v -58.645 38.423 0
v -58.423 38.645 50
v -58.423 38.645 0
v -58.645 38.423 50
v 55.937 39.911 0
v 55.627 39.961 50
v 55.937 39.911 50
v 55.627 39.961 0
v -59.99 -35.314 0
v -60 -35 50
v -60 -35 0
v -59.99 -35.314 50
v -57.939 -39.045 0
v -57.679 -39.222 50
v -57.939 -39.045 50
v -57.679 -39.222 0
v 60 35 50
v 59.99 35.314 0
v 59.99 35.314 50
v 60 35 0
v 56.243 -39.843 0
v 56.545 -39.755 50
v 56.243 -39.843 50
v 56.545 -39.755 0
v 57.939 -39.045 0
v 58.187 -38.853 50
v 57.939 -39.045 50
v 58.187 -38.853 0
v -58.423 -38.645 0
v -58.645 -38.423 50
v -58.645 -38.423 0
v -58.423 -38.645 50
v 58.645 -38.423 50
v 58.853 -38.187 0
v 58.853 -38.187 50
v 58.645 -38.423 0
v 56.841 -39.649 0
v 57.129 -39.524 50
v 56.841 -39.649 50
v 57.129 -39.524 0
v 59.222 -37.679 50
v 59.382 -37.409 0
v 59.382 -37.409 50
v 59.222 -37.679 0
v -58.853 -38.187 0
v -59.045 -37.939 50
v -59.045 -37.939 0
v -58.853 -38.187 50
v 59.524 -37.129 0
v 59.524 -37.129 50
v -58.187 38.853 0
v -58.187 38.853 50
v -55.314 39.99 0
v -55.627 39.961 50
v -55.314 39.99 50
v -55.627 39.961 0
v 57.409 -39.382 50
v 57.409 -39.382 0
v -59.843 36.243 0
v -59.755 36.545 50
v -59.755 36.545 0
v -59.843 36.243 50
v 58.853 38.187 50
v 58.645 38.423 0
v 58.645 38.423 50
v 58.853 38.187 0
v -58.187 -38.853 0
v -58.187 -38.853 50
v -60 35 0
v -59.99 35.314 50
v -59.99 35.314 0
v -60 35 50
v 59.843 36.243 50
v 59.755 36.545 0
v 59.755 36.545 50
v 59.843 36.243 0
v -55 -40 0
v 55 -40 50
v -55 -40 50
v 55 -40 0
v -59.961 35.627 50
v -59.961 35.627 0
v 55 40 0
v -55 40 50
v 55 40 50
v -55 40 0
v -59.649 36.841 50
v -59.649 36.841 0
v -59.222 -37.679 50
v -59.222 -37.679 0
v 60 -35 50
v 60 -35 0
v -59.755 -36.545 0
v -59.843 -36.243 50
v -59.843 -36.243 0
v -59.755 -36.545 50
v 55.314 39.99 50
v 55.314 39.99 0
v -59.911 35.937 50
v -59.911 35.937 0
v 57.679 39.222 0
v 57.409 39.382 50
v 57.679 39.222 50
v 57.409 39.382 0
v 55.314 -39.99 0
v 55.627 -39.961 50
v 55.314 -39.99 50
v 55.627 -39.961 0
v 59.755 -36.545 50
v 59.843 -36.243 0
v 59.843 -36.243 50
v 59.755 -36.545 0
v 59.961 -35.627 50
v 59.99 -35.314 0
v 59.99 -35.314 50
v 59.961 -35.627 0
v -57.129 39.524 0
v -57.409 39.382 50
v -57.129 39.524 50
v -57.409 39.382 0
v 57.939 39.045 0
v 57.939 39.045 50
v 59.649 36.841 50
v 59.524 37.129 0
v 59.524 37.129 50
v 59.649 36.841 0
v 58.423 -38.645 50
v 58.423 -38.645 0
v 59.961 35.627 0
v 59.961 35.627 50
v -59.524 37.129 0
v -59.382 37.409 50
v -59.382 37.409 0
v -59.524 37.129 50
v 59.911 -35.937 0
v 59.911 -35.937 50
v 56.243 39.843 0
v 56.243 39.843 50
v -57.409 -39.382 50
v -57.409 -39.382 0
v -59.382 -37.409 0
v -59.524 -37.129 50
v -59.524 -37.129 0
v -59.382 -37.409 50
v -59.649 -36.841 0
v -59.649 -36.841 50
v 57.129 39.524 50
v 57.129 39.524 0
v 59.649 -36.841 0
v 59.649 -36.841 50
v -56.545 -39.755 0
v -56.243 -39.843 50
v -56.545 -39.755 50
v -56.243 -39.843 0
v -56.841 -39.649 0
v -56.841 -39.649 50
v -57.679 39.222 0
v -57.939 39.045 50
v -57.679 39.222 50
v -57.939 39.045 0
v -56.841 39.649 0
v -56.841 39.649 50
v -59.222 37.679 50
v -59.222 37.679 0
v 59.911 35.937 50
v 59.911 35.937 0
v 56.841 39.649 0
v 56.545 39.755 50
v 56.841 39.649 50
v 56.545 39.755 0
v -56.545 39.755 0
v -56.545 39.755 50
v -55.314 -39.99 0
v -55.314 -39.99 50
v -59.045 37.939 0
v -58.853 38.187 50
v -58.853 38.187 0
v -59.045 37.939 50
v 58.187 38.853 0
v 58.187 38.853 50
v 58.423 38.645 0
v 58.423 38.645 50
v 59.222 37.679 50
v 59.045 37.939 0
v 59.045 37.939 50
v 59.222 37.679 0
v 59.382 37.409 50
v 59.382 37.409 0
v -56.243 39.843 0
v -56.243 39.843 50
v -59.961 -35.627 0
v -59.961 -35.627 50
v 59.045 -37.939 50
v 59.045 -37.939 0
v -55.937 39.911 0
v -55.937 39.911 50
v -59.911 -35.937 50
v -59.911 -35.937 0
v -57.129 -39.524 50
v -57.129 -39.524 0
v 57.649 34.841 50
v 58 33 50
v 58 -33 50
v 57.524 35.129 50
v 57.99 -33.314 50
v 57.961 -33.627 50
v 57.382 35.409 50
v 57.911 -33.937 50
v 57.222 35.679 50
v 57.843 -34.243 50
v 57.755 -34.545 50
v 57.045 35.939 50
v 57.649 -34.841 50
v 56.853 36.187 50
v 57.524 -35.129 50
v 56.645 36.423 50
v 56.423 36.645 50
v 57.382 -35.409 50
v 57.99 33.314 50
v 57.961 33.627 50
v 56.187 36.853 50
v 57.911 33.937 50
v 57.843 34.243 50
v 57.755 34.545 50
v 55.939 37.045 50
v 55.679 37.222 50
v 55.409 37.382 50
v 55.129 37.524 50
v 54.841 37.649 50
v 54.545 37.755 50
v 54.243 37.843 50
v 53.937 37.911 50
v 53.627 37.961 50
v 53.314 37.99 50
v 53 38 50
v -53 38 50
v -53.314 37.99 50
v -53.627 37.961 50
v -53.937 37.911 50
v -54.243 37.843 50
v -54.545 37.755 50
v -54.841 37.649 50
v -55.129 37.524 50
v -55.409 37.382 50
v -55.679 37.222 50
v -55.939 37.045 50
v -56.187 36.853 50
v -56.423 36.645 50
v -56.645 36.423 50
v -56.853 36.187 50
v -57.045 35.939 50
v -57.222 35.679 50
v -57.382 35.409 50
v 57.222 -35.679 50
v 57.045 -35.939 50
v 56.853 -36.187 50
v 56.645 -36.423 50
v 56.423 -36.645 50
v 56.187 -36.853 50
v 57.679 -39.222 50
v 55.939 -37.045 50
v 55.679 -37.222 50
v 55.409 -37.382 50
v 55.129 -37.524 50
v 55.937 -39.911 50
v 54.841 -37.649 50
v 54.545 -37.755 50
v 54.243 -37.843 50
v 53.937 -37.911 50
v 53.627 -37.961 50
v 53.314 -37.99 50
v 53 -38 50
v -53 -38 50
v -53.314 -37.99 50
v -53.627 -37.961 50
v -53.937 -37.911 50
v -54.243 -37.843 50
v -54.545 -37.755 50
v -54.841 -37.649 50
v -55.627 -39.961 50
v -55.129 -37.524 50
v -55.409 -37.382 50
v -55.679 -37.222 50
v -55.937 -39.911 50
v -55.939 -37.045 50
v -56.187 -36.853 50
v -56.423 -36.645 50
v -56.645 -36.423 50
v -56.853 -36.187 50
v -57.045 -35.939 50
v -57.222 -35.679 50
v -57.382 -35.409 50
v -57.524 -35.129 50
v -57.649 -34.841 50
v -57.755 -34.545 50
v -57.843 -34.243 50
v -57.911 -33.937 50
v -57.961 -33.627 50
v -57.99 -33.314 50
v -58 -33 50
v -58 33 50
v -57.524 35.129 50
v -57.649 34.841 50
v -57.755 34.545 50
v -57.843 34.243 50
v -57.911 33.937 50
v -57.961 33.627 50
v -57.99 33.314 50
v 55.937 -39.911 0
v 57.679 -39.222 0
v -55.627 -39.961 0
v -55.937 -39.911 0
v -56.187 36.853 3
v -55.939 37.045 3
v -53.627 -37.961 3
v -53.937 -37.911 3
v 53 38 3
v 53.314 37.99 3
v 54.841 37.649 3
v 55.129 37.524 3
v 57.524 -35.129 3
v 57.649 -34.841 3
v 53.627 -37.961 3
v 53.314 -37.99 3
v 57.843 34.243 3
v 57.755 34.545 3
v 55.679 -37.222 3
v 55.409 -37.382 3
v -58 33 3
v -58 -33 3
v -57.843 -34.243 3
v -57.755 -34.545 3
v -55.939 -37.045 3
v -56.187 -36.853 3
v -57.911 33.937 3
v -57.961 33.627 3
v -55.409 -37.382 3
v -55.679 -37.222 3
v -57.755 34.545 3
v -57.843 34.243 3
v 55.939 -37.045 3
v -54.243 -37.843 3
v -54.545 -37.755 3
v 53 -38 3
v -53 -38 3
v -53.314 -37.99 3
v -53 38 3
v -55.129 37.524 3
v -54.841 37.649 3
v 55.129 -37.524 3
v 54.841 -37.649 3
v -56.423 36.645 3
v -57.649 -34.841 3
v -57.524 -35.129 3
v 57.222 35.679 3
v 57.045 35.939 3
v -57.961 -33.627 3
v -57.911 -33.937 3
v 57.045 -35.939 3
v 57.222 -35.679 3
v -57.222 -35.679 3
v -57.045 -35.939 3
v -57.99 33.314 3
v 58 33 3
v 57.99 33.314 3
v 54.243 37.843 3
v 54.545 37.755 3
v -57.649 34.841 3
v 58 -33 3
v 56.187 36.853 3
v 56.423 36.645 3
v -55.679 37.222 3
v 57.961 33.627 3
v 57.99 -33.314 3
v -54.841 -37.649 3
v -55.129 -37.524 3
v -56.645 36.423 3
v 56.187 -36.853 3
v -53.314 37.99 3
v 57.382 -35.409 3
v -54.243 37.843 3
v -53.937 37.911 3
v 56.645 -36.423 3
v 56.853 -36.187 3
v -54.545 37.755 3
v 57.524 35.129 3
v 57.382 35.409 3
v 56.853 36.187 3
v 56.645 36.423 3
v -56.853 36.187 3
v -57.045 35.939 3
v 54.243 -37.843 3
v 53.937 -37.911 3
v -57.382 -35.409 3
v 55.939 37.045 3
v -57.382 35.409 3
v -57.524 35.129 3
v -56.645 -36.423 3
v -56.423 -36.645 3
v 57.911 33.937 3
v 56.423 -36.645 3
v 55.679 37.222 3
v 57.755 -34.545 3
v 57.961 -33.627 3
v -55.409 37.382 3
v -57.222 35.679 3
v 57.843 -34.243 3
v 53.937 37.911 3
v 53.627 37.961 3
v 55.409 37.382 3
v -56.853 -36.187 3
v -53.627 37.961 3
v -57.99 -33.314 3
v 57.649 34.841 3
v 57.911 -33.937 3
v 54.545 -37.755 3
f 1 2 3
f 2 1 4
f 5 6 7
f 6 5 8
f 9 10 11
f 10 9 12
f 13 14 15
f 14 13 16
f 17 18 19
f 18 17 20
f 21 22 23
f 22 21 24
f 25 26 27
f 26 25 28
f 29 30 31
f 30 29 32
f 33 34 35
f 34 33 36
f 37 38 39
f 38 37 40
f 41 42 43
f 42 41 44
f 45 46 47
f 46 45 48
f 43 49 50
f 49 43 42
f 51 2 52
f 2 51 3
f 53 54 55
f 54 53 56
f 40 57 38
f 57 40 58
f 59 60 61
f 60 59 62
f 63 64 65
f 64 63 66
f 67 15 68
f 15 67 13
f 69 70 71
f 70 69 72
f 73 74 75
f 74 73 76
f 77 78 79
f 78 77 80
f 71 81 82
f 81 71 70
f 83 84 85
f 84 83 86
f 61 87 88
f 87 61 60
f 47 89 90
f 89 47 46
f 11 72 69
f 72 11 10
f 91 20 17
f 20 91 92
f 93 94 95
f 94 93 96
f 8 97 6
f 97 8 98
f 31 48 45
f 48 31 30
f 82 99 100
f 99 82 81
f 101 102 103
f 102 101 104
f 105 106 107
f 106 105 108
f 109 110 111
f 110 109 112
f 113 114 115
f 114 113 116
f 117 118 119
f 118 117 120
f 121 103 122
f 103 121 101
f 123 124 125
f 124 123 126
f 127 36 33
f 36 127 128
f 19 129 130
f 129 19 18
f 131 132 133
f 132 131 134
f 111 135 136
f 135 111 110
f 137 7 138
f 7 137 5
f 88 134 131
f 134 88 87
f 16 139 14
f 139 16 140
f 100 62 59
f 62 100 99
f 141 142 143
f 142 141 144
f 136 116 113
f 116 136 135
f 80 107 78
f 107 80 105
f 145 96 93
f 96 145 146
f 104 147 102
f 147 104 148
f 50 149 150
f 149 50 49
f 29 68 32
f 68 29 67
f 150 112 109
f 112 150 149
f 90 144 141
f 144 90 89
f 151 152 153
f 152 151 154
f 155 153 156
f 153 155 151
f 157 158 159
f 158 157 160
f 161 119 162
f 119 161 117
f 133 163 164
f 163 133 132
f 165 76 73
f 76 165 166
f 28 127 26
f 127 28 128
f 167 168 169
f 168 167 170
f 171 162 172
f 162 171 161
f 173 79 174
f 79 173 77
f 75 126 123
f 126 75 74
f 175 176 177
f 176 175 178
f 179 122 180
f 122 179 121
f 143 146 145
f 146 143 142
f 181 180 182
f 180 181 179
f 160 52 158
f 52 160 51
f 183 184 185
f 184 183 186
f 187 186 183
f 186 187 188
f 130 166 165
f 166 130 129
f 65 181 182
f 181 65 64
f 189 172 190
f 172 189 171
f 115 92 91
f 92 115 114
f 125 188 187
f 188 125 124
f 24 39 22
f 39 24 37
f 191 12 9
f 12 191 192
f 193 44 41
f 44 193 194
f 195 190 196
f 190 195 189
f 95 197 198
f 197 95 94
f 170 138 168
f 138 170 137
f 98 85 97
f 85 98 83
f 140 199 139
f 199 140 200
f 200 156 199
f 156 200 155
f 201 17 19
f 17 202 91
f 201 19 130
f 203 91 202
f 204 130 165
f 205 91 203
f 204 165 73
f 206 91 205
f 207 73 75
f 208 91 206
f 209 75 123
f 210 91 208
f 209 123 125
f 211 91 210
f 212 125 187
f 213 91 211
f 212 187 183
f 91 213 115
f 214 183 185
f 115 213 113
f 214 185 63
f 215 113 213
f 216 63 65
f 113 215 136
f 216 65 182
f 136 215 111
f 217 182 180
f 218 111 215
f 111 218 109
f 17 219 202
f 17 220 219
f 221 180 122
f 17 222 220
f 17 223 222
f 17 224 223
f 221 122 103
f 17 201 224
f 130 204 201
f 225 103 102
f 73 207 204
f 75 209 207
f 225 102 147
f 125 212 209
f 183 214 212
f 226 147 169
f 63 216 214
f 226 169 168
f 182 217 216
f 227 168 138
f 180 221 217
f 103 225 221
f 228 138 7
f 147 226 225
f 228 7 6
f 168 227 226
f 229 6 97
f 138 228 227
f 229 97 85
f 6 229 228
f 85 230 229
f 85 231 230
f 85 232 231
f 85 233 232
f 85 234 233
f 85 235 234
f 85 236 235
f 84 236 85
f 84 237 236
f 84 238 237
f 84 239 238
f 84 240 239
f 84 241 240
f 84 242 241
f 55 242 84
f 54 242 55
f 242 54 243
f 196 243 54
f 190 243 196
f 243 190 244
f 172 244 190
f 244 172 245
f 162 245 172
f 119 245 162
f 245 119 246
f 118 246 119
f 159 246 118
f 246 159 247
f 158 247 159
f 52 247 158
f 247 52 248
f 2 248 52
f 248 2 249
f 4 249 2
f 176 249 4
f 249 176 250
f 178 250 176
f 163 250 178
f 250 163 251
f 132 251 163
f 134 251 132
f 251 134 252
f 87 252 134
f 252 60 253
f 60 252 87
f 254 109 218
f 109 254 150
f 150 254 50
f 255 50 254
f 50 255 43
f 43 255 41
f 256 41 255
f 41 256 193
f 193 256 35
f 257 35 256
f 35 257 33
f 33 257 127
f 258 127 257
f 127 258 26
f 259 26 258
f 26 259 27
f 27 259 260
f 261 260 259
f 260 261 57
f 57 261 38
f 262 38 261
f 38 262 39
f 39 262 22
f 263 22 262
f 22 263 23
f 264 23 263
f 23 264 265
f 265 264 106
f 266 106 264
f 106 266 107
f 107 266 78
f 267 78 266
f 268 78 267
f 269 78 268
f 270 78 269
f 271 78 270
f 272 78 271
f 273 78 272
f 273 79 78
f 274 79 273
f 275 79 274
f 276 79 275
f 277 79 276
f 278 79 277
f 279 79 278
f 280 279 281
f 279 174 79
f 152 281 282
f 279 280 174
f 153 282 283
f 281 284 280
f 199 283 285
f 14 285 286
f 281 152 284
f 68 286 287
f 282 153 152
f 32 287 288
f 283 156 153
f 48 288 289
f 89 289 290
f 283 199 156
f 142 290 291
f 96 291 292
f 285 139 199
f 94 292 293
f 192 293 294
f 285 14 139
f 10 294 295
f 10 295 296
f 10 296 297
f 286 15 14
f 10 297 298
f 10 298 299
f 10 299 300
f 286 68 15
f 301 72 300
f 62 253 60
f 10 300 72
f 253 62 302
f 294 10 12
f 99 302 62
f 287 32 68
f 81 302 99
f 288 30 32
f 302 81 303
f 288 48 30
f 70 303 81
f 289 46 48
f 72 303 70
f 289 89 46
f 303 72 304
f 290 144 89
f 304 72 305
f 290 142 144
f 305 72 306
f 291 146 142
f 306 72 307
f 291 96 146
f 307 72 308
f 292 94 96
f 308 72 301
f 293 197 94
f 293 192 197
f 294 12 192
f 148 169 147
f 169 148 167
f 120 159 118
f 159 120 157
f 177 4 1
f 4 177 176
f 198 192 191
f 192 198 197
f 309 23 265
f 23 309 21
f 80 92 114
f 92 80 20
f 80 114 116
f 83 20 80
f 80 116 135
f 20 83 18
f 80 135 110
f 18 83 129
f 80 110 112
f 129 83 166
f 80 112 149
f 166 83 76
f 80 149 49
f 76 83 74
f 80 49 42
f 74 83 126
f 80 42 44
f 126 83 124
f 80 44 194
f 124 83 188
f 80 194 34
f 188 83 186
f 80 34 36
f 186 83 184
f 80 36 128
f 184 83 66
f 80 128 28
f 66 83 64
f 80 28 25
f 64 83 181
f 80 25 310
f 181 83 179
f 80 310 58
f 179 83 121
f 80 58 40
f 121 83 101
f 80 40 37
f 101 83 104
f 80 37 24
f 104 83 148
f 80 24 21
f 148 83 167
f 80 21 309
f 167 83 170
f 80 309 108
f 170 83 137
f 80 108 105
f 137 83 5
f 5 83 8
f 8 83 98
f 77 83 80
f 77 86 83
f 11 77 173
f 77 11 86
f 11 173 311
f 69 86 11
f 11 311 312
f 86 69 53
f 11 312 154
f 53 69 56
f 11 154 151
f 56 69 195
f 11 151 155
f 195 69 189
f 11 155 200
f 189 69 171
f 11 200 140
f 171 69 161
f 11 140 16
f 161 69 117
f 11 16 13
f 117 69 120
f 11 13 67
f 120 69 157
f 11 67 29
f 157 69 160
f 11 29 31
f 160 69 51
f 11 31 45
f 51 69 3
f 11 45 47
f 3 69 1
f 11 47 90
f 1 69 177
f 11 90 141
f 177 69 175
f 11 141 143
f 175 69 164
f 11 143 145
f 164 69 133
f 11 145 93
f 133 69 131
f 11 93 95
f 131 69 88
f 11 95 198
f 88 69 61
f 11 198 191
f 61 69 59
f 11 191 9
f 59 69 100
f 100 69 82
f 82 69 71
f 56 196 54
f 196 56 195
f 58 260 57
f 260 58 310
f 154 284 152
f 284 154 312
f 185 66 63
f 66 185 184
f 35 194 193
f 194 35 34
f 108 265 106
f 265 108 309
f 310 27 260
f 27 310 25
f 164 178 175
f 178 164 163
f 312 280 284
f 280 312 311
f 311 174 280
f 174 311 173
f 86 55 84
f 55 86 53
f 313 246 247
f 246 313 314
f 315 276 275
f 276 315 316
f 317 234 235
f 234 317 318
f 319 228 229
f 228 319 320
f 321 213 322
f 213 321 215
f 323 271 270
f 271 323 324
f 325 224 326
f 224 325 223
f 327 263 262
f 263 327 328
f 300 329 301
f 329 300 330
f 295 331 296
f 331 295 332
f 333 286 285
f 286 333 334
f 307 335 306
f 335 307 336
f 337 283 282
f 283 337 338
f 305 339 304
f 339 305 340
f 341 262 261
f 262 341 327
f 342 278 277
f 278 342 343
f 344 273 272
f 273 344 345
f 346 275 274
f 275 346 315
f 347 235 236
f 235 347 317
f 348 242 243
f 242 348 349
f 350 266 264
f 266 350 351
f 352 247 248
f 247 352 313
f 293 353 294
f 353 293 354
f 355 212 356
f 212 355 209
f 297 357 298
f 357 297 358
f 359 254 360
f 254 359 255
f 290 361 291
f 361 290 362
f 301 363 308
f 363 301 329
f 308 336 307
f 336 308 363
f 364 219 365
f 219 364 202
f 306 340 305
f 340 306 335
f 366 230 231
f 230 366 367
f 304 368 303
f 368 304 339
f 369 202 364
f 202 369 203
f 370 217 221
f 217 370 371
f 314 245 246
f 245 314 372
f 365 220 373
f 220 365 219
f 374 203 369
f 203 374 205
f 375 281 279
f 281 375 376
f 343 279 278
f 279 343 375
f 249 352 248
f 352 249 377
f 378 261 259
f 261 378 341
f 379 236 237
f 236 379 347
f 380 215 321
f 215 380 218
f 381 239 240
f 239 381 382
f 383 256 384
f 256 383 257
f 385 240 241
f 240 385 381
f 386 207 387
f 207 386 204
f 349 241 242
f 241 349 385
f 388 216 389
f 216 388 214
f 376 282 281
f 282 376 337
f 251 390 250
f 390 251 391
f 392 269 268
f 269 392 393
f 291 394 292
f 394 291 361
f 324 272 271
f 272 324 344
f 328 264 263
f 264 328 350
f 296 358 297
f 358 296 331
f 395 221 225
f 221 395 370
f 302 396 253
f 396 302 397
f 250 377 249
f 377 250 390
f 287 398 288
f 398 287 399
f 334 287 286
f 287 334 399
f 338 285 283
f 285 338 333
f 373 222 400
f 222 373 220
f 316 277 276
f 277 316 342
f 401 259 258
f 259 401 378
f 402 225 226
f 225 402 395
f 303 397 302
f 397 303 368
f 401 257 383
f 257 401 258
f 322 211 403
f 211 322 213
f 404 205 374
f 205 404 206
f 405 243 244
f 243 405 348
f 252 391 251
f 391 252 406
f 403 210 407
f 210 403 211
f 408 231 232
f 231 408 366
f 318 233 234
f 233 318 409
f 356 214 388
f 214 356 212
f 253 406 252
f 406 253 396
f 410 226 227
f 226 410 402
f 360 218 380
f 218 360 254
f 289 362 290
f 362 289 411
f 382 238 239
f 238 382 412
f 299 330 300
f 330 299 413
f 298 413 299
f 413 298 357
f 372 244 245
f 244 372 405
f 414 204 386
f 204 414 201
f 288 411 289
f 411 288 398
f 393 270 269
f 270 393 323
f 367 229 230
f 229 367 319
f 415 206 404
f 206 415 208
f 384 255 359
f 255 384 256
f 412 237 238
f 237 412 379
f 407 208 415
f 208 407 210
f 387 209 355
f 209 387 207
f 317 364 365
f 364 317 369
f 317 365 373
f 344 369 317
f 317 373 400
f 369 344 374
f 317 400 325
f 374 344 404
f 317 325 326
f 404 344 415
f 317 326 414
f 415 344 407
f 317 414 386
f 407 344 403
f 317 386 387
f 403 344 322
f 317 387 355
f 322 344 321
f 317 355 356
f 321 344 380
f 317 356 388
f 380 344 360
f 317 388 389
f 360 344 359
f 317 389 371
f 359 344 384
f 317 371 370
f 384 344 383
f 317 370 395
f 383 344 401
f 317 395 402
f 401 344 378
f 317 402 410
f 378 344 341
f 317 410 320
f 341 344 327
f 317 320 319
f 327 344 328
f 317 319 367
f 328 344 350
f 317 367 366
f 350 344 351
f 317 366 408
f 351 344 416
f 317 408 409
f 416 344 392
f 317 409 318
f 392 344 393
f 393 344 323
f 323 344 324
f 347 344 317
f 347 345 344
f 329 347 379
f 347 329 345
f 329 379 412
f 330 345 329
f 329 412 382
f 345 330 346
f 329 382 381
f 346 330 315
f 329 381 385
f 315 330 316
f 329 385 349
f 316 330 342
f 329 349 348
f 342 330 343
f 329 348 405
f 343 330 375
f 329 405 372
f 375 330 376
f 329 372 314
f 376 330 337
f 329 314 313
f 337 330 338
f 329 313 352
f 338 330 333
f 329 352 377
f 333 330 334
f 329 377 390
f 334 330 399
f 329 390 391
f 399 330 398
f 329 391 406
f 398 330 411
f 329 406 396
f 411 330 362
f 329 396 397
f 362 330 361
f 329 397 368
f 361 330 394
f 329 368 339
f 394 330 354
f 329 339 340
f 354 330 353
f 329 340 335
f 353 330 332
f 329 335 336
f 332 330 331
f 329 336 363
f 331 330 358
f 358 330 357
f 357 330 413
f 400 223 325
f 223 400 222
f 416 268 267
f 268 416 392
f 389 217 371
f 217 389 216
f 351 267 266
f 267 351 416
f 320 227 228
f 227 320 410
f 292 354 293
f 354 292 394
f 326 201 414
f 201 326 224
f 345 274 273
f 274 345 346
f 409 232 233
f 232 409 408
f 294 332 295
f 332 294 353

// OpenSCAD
/*
 * Project:     RoundedBox.scad
 * Version:     1.0
 * Author:      Reinhard Loch
 * Copyright:   2024
 * License:     2-clause BSD License
 *              (http://opensource.org/licenses/BSD-2-Clause)
 */


/* [Hidden] */

$fn = $preview ? 40 : 100;


/* [Box Dimensions] */

// Height
h = 50; // [10:200]

// Width
w = 120; // [10:250]

// Depth
d = 80; // [10:250]

// Radius
r = 5; // [1:10]


/* [Thickness] */

// Wall Thickness
wth = 2; // [1:10]

// Bottom Thickness
bth = 3; // [1:10]


translate([-w/2 + r, -d/2 + r, 0])

    difference() {
    
        minkowski() {
            cube([w - 2*r, d - 2*r, h/2]);
            cylinder(h = h/2, r = r);
        };
    
        translate([wth, wth, bth])
            minkowski() {
                cube([w - 2*r - 2*wth, d - 2*r - 2*wth, h/2]);
                cylinder(h = h/2, r = r);
            };

    };
